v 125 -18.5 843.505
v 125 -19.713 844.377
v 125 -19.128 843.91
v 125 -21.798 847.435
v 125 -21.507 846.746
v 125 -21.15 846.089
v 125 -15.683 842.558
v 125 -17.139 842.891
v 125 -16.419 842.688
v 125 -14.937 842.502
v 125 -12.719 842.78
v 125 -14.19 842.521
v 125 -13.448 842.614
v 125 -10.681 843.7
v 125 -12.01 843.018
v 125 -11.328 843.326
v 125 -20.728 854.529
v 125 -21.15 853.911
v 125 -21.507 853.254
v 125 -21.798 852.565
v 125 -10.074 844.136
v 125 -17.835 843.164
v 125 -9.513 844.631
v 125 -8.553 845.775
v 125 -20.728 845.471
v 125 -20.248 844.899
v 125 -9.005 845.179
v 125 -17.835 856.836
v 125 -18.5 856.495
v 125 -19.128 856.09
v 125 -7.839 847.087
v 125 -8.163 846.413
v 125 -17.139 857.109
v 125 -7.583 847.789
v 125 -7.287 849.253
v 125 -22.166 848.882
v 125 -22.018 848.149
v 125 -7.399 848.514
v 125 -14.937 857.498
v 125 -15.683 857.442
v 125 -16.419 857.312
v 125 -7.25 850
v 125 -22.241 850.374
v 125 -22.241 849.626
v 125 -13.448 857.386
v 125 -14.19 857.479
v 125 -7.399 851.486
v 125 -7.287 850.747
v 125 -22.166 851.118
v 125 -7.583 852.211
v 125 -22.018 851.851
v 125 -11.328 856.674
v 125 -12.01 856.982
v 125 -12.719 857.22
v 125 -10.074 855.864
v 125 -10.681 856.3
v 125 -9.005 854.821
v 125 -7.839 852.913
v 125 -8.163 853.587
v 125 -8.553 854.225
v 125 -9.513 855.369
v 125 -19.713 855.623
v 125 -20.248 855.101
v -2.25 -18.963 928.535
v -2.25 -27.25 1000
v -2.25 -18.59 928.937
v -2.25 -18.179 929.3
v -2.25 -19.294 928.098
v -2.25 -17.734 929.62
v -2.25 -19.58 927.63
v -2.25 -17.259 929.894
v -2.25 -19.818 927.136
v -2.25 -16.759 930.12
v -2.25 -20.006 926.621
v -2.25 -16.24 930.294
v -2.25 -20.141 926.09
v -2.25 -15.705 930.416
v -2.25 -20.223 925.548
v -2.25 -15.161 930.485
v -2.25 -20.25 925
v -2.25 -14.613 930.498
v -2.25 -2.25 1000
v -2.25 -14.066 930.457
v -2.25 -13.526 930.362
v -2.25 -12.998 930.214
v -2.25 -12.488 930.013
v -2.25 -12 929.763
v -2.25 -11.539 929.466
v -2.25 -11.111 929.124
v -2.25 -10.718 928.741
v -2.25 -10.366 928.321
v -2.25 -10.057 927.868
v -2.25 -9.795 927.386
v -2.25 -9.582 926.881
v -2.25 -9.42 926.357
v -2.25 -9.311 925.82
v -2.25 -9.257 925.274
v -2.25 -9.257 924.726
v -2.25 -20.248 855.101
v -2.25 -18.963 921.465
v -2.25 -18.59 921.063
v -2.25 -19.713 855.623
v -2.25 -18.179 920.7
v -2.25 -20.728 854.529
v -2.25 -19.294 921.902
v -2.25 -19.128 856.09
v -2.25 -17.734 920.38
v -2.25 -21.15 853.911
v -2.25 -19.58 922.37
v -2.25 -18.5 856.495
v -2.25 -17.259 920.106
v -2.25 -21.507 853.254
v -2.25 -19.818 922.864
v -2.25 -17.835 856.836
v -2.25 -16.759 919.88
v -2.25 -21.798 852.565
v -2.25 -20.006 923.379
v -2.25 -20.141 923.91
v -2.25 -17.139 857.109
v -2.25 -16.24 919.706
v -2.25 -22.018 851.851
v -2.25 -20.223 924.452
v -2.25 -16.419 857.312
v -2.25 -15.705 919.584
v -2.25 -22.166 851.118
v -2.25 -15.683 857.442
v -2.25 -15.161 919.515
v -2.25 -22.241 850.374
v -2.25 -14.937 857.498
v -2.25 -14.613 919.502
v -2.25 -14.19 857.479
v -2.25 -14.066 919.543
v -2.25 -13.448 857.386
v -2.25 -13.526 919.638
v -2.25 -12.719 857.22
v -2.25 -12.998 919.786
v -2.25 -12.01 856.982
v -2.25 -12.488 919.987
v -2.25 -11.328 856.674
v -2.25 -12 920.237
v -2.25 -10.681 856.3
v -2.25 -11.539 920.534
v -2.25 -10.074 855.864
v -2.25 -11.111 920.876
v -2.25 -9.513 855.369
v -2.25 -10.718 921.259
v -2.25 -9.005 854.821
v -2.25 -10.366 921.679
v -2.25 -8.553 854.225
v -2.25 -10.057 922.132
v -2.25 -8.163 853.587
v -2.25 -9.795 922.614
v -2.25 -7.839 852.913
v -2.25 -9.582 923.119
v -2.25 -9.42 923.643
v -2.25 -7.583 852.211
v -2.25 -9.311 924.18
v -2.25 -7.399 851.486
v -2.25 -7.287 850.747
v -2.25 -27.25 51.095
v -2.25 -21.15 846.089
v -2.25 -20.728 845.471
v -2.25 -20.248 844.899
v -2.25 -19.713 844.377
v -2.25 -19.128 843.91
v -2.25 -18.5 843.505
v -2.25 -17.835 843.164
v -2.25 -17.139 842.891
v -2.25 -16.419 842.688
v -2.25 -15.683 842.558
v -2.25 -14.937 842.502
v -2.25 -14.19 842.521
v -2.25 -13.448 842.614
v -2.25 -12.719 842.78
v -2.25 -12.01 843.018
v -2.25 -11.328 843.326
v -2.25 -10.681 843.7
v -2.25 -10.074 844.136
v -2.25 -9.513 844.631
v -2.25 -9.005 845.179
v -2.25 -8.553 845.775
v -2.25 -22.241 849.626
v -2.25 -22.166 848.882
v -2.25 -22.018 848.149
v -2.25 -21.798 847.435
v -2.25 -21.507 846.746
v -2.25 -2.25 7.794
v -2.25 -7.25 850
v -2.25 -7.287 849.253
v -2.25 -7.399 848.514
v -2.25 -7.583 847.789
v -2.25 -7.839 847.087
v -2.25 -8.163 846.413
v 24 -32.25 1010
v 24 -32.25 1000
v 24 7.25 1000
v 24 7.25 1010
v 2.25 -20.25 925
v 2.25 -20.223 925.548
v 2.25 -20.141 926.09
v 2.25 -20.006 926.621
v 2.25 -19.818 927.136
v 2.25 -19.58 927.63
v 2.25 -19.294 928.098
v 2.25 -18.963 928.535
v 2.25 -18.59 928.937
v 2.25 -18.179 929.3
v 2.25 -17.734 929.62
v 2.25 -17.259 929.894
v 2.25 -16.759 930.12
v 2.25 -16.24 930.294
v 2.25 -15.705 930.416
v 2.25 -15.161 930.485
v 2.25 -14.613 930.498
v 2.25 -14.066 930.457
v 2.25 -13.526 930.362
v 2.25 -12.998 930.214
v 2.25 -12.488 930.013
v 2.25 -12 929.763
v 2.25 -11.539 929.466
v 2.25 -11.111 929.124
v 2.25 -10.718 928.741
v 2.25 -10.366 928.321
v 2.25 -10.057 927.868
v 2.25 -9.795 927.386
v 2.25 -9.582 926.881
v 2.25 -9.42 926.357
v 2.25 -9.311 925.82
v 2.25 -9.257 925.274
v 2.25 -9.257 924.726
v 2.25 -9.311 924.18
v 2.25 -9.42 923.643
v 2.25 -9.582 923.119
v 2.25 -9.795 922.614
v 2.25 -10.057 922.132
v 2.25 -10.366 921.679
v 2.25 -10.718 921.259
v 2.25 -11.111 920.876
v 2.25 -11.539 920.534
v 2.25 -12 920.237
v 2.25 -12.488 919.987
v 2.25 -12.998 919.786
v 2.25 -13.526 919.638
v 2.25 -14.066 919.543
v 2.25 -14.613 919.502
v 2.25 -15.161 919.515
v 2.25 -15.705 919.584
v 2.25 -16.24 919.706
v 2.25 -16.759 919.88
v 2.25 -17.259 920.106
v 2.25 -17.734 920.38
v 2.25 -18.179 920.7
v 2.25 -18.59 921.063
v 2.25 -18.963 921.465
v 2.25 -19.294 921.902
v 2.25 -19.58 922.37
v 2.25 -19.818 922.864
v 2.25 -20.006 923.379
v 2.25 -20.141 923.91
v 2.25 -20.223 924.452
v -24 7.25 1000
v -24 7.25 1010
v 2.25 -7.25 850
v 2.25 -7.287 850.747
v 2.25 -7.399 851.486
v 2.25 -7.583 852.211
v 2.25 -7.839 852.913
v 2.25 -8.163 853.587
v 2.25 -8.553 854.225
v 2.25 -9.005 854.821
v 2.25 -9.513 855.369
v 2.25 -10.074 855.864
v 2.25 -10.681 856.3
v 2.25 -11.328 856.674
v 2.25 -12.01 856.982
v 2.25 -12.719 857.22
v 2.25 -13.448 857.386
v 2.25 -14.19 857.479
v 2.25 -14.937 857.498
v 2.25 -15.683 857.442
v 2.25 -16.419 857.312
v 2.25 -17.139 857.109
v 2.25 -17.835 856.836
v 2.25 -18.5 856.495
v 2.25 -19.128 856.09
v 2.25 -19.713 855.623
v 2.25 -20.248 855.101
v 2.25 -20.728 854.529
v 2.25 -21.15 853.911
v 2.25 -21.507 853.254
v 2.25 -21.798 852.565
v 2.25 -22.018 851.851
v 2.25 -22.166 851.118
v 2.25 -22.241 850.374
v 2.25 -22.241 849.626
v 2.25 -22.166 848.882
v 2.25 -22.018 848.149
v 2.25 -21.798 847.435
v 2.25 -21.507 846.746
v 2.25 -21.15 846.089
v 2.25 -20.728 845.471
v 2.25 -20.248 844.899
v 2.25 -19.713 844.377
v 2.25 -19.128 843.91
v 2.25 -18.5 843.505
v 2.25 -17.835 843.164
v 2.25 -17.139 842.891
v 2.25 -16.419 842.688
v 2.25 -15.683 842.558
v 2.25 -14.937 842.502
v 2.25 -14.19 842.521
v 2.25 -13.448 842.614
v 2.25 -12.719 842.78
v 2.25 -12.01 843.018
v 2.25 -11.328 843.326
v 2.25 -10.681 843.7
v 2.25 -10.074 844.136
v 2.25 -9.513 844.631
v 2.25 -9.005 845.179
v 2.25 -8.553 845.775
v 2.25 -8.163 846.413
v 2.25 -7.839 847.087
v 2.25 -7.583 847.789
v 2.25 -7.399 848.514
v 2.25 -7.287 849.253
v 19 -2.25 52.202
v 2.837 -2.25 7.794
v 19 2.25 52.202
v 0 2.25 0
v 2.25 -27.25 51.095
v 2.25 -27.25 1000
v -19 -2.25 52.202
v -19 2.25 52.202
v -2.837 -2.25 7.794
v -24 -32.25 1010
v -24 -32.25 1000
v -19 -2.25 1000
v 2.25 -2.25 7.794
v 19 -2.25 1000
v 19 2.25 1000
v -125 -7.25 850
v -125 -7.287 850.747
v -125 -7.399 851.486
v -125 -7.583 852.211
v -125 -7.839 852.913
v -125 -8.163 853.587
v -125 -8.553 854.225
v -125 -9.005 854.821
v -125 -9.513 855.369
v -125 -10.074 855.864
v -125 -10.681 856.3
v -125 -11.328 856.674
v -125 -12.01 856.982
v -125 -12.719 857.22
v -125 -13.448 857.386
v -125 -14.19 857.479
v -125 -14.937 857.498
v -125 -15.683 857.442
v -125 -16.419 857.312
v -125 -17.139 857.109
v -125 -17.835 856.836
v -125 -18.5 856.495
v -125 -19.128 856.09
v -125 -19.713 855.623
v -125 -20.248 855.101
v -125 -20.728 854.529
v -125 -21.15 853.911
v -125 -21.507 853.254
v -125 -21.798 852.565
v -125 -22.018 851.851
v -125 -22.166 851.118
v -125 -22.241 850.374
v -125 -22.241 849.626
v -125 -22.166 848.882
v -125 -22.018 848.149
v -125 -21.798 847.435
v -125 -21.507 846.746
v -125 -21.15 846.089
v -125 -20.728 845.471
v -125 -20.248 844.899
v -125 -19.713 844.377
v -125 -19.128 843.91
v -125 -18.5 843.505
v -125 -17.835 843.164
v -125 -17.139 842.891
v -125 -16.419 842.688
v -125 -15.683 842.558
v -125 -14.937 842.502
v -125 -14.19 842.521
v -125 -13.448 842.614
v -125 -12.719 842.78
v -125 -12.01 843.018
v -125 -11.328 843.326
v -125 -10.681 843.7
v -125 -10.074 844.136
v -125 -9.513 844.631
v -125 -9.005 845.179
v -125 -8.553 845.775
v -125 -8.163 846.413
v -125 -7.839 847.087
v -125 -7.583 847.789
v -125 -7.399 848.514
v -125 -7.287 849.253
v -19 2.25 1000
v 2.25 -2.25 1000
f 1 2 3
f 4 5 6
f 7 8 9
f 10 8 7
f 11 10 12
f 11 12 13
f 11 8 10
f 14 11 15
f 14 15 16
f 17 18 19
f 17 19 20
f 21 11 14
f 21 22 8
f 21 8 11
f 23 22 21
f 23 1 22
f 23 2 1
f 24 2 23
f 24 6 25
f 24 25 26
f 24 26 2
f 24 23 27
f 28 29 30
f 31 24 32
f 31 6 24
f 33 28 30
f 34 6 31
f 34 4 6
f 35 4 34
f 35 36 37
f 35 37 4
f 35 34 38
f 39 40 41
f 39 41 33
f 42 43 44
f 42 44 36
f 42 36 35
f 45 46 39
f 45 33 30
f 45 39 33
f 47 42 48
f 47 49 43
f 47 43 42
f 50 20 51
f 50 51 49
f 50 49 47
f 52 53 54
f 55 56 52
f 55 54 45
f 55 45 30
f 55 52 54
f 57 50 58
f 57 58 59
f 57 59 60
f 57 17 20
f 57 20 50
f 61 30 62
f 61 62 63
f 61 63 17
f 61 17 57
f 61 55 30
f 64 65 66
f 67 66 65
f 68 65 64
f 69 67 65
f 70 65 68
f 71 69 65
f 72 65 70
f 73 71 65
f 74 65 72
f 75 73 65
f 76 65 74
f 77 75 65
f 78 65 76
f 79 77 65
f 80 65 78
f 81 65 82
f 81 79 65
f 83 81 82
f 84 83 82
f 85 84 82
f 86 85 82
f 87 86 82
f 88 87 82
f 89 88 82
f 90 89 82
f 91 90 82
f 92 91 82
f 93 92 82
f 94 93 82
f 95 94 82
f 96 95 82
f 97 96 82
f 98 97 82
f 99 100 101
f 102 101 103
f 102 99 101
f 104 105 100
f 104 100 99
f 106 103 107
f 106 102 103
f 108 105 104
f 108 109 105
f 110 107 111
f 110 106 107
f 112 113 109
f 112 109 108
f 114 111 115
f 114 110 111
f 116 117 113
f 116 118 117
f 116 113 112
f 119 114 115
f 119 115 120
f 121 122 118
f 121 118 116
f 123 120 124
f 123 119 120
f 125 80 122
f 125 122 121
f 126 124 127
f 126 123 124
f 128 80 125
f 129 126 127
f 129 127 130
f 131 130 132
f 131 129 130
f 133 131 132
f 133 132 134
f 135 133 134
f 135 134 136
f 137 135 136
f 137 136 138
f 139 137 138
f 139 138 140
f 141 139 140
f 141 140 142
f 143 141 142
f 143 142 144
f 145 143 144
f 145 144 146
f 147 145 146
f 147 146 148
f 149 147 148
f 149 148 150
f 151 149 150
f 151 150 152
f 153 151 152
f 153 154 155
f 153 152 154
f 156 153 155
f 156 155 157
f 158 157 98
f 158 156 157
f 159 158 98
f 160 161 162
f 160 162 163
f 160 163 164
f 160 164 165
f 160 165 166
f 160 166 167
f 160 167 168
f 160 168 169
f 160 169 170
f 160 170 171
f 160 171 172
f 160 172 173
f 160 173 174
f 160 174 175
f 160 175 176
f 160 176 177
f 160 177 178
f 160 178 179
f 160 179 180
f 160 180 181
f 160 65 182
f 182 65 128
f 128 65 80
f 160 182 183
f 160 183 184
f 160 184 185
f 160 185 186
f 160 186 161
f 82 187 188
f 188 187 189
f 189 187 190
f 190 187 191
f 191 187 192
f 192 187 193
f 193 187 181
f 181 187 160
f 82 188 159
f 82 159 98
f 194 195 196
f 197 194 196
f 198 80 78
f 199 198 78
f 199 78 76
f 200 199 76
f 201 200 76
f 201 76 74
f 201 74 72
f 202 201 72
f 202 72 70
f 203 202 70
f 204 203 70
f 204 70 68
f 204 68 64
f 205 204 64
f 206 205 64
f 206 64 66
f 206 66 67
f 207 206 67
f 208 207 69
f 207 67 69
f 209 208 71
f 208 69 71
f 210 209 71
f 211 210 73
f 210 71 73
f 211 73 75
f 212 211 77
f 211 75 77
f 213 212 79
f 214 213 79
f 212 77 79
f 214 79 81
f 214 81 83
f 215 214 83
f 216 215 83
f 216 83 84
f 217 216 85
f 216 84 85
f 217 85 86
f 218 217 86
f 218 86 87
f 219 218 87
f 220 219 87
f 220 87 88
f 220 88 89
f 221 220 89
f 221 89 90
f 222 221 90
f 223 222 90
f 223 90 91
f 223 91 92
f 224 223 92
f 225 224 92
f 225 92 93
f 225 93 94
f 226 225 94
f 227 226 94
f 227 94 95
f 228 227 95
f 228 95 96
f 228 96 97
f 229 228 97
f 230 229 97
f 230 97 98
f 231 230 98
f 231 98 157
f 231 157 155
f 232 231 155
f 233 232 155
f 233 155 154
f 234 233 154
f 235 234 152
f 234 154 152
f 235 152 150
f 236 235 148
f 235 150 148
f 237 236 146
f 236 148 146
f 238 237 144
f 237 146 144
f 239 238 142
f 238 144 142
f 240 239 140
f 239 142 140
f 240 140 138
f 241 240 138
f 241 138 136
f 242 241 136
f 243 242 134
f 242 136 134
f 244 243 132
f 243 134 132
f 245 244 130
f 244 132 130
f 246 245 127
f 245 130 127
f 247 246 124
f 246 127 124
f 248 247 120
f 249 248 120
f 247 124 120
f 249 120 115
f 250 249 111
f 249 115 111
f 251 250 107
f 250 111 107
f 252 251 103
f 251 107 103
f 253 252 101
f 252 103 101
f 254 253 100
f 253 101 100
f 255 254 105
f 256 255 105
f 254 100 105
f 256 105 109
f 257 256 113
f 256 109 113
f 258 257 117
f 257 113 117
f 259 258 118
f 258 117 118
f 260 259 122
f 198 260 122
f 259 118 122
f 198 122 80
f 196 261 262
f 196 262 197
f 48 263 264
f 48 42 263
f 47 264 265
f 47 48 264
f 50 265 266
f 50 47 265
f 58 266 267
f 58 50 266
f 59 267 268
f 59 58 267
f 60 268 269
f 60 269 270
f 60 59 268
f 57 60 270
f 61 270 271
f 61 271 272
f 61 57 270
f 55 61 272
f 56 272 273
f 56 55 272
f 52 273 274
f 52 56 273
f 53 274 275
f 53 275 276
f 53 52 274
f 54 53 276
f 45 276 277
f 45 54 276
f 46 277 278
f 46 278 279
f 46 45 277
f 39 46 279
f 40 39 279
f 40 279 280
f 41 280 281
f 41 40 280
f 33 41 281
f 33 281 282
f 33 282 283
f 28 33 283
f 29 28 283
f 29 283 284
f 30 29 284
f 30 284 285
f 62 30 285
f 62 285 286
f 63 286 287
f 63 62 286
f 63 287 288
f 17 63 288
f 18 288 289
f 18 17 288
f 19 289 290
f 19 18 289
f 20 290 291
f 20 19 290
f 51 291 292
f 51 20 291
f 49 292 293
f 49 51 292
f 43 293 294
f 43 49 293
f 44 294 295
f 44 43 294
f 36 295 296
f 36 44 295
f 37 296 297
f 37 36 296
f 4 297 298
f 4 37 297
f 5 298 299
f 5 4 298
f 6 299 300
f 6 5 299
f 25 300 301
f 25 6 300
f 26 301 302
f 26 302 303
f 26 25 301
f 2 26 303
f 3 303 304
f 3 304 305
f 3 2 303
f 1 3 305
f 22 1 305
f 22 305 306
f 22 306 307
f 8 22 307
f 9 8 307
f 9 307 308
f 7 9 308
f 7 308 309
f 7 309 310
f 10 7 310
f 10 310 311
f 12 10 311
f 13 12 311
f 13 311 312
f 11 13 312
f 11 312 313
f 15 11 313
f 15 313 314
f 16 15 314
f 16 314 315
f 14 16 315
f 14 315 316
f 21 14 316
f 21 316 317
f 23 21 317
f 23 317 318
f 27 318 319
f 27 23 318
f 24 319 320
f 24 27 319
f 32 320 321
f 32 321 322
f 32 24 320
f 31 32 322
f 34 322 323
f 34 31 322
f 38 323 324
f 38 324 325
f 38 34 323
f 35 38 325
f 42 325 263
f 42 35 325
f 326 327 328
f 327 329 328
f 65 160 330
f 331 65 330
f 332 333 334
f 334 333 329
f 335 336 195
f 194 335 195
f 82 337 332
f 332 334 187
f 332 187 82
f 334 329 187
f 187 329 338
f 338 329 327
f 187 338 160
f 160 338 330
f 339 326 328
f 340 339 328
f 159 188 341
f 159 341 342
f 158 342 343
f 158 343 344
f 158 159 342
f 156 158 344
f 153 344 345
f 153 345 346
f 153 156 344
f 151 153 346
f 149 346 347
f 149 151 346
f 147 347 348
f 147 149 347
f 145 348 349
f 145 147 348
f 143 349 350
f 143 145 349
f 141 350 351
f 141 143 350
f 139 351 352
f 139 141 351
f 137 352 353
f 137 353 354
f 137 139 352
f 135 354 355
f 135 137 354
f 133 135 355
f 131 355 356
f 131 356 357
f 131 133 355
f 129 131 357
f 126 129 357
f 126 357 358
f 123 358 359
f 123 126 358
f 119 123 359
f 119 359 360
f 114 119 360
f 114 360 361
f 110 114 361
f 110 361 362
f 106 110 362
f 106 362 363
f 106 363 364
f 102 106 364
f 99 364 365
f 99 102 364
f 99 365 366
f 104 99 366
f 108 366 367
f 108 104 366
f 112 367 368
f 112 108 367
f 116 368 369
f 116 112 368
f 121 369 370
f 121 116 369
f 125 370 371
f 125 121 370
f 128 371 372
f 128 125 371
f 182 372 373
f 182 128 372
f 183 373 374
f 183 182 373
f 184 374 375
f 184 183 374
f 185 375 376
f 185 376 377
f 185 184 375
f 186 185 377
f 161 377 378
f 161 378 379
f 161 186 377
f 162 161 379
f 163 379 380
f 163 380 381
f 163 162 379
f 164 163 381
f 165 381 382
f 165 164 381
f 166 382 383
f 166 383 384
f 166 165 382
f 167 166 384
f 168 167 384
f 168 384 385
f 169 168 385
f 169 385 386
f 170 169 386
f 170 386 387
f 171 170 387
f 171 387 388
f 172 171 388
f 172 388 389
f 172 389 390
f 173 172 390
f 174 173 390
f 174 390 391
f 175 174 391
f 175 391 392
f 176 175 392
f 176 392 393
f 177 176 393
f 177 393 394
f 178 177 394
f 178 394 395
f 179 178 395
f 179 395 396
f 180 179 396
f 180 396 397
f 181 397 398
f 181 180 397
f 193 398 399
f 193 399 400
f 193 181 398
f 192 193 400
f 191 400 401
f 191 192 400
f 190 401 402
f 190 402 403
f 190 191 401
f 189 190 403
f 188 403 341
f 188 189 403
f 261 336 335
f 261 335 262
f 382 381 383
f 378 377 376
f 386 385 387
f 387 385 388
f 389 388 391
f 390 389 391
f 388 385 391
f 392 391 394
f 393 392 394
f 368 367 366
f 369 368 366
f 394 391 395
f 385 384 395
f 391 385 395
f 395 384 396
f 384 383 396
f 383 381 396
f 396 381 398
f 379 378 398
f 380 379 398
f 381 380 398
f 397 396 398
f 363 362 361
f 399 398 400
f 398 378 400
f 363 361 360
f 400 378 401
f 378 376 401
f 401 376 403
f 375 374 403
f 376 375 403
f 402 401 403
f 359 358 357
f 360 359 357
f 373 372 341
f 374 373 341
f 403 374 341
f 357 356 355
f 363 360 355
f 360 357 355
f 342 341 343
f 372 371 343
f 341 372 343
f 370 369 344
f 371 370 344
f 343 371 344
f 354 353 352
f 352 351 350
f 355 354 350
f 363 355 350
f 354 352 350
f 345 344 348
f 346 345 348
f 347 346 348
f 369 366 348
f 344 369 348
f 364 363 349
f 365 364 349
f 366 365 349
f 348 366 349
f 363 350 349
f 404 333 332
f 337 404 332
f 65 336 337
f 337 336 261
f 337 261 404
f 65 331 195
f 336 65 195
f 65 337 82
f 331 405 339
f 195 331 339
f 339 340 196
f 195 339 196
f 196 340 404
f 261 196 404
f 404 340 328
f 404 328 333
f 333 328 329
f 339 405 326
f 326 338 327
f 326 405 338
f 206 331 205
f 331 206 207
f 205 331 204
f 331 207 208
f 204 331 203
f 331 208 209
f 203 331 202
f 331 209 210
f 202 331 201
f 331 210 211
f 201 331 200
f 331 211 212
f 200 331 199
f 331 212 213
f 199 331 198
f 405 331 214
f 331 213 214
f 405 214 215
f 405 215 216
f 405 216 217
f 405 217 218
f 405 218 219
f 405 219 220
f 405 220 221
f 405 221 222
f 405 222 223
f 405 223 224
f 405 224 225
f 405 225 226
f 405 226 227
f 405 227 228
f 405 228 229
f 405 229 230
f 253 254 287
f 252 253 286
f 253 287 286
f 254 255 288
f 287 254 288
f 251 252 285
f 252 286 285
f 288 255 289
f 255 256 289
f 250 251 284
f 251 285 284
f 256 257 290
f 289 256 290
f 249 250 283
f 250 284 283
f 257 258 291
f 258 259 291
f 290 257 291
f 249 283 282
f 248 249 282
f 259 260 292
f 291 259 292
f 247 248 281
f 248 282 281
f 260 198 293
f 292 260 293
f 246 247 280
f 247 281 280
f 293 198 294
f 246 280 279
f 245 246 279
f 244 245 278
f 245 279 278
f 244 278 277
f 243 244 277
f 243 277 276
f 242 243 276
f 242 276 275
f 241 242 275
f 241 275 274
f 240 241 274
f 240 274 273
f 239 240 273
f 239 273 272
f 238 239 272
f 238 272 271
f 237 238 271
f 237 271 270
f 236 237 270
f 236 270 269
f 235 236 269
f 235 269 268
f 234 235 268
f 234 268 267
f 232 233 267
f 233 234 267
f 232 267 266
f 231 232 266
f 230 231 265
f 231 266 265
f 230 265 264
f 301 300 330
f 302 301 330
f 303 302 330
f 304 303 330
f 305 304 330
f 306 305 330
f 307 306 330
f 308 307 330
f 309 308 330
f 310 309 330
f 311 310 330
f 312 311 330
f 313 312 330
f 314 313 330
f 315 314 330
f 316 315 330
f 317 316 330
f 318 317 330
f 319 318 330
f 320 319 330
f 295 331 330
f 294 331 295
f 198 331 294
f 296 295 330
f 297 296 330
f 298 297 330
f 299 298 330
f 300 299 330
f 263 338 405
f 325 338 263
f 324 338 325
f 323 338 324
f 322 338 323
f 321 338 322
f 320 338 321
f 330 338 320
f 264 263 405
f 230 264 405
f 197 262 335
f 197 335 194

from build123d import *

# Parameters (mm, degrees)
F0_W     = 4.5
F0_H     = 25
F1_DEPTH = 1000
F2_R     = 7.5
F3_DEPTH = 125
F4_W     = 48
F4_H     = 39.5
F5_DEPTH = 10
F7_DEPTH = 50
F9_DEPTH = 34.501
F11_D    = 11


with BuildPart() as f1:
    # F0 (on Top) → F1 (new body)
    with BuildSketch(Plane.XY):
        Polygon((2.25, -2.25), (19, -2.25), (19, 2.25), (-19, 2.25), (-19, -2.25), (-2.25, -2.25), align=None)
        with Locations((0, -14.75)):
            Rectangle(F0_W, F0_H)
    extrude(amount=F1_DEPTH)

    # F2 (on Right) → F3 (join, symmetric)
    with BuildSketch(Plane.YZ):
        with Locations((-14.75, 850)):
            Circle(F2_R)
    extrude(amount=F3_DEPTH, both=True)

    # F4 (on face) → F5 (join)
    with BuildSketch(Plane.XY.offset(1000)):
        with Locations((0, -12.5)):
            Rectangle(F4_W, F4_H)
    extrude(amount=F5_DEPTH)

    # F6 (on Right) → F7 (cut, symmetric)
    with BuildSketch(Plane.YZ):
        Polygon((-27.25, 0), (2.25, 0), (-27.25, 51.0954988233), align=None)
    extrude(amount=F7_DEPTH, both=True, mode=Mode.SUBTRACT)

    # F8 (on face) → F9 (cut, through all)
    with BuildSketch(Plane(origin=(0, 2.25, 0), x_dir=(-1, 0, 0), z_dir=(0, 1, 0))):
        Polygon((-19, 0), (0, 0), (-19, 52.2020709696), align=None)
        Polygon((19, 52.2020709696), (0, 0), (19, 0), align=None)
    extrude(amount=-F9_DEPTH, mode=Mode.SUBTRACT)

    # F11 (through all)
    with Locations(Plane.YZ.offset(2.25)):
        with Locations((-14.75, 925)):
            Hole(F11_D / 2)


solid = f1.part
